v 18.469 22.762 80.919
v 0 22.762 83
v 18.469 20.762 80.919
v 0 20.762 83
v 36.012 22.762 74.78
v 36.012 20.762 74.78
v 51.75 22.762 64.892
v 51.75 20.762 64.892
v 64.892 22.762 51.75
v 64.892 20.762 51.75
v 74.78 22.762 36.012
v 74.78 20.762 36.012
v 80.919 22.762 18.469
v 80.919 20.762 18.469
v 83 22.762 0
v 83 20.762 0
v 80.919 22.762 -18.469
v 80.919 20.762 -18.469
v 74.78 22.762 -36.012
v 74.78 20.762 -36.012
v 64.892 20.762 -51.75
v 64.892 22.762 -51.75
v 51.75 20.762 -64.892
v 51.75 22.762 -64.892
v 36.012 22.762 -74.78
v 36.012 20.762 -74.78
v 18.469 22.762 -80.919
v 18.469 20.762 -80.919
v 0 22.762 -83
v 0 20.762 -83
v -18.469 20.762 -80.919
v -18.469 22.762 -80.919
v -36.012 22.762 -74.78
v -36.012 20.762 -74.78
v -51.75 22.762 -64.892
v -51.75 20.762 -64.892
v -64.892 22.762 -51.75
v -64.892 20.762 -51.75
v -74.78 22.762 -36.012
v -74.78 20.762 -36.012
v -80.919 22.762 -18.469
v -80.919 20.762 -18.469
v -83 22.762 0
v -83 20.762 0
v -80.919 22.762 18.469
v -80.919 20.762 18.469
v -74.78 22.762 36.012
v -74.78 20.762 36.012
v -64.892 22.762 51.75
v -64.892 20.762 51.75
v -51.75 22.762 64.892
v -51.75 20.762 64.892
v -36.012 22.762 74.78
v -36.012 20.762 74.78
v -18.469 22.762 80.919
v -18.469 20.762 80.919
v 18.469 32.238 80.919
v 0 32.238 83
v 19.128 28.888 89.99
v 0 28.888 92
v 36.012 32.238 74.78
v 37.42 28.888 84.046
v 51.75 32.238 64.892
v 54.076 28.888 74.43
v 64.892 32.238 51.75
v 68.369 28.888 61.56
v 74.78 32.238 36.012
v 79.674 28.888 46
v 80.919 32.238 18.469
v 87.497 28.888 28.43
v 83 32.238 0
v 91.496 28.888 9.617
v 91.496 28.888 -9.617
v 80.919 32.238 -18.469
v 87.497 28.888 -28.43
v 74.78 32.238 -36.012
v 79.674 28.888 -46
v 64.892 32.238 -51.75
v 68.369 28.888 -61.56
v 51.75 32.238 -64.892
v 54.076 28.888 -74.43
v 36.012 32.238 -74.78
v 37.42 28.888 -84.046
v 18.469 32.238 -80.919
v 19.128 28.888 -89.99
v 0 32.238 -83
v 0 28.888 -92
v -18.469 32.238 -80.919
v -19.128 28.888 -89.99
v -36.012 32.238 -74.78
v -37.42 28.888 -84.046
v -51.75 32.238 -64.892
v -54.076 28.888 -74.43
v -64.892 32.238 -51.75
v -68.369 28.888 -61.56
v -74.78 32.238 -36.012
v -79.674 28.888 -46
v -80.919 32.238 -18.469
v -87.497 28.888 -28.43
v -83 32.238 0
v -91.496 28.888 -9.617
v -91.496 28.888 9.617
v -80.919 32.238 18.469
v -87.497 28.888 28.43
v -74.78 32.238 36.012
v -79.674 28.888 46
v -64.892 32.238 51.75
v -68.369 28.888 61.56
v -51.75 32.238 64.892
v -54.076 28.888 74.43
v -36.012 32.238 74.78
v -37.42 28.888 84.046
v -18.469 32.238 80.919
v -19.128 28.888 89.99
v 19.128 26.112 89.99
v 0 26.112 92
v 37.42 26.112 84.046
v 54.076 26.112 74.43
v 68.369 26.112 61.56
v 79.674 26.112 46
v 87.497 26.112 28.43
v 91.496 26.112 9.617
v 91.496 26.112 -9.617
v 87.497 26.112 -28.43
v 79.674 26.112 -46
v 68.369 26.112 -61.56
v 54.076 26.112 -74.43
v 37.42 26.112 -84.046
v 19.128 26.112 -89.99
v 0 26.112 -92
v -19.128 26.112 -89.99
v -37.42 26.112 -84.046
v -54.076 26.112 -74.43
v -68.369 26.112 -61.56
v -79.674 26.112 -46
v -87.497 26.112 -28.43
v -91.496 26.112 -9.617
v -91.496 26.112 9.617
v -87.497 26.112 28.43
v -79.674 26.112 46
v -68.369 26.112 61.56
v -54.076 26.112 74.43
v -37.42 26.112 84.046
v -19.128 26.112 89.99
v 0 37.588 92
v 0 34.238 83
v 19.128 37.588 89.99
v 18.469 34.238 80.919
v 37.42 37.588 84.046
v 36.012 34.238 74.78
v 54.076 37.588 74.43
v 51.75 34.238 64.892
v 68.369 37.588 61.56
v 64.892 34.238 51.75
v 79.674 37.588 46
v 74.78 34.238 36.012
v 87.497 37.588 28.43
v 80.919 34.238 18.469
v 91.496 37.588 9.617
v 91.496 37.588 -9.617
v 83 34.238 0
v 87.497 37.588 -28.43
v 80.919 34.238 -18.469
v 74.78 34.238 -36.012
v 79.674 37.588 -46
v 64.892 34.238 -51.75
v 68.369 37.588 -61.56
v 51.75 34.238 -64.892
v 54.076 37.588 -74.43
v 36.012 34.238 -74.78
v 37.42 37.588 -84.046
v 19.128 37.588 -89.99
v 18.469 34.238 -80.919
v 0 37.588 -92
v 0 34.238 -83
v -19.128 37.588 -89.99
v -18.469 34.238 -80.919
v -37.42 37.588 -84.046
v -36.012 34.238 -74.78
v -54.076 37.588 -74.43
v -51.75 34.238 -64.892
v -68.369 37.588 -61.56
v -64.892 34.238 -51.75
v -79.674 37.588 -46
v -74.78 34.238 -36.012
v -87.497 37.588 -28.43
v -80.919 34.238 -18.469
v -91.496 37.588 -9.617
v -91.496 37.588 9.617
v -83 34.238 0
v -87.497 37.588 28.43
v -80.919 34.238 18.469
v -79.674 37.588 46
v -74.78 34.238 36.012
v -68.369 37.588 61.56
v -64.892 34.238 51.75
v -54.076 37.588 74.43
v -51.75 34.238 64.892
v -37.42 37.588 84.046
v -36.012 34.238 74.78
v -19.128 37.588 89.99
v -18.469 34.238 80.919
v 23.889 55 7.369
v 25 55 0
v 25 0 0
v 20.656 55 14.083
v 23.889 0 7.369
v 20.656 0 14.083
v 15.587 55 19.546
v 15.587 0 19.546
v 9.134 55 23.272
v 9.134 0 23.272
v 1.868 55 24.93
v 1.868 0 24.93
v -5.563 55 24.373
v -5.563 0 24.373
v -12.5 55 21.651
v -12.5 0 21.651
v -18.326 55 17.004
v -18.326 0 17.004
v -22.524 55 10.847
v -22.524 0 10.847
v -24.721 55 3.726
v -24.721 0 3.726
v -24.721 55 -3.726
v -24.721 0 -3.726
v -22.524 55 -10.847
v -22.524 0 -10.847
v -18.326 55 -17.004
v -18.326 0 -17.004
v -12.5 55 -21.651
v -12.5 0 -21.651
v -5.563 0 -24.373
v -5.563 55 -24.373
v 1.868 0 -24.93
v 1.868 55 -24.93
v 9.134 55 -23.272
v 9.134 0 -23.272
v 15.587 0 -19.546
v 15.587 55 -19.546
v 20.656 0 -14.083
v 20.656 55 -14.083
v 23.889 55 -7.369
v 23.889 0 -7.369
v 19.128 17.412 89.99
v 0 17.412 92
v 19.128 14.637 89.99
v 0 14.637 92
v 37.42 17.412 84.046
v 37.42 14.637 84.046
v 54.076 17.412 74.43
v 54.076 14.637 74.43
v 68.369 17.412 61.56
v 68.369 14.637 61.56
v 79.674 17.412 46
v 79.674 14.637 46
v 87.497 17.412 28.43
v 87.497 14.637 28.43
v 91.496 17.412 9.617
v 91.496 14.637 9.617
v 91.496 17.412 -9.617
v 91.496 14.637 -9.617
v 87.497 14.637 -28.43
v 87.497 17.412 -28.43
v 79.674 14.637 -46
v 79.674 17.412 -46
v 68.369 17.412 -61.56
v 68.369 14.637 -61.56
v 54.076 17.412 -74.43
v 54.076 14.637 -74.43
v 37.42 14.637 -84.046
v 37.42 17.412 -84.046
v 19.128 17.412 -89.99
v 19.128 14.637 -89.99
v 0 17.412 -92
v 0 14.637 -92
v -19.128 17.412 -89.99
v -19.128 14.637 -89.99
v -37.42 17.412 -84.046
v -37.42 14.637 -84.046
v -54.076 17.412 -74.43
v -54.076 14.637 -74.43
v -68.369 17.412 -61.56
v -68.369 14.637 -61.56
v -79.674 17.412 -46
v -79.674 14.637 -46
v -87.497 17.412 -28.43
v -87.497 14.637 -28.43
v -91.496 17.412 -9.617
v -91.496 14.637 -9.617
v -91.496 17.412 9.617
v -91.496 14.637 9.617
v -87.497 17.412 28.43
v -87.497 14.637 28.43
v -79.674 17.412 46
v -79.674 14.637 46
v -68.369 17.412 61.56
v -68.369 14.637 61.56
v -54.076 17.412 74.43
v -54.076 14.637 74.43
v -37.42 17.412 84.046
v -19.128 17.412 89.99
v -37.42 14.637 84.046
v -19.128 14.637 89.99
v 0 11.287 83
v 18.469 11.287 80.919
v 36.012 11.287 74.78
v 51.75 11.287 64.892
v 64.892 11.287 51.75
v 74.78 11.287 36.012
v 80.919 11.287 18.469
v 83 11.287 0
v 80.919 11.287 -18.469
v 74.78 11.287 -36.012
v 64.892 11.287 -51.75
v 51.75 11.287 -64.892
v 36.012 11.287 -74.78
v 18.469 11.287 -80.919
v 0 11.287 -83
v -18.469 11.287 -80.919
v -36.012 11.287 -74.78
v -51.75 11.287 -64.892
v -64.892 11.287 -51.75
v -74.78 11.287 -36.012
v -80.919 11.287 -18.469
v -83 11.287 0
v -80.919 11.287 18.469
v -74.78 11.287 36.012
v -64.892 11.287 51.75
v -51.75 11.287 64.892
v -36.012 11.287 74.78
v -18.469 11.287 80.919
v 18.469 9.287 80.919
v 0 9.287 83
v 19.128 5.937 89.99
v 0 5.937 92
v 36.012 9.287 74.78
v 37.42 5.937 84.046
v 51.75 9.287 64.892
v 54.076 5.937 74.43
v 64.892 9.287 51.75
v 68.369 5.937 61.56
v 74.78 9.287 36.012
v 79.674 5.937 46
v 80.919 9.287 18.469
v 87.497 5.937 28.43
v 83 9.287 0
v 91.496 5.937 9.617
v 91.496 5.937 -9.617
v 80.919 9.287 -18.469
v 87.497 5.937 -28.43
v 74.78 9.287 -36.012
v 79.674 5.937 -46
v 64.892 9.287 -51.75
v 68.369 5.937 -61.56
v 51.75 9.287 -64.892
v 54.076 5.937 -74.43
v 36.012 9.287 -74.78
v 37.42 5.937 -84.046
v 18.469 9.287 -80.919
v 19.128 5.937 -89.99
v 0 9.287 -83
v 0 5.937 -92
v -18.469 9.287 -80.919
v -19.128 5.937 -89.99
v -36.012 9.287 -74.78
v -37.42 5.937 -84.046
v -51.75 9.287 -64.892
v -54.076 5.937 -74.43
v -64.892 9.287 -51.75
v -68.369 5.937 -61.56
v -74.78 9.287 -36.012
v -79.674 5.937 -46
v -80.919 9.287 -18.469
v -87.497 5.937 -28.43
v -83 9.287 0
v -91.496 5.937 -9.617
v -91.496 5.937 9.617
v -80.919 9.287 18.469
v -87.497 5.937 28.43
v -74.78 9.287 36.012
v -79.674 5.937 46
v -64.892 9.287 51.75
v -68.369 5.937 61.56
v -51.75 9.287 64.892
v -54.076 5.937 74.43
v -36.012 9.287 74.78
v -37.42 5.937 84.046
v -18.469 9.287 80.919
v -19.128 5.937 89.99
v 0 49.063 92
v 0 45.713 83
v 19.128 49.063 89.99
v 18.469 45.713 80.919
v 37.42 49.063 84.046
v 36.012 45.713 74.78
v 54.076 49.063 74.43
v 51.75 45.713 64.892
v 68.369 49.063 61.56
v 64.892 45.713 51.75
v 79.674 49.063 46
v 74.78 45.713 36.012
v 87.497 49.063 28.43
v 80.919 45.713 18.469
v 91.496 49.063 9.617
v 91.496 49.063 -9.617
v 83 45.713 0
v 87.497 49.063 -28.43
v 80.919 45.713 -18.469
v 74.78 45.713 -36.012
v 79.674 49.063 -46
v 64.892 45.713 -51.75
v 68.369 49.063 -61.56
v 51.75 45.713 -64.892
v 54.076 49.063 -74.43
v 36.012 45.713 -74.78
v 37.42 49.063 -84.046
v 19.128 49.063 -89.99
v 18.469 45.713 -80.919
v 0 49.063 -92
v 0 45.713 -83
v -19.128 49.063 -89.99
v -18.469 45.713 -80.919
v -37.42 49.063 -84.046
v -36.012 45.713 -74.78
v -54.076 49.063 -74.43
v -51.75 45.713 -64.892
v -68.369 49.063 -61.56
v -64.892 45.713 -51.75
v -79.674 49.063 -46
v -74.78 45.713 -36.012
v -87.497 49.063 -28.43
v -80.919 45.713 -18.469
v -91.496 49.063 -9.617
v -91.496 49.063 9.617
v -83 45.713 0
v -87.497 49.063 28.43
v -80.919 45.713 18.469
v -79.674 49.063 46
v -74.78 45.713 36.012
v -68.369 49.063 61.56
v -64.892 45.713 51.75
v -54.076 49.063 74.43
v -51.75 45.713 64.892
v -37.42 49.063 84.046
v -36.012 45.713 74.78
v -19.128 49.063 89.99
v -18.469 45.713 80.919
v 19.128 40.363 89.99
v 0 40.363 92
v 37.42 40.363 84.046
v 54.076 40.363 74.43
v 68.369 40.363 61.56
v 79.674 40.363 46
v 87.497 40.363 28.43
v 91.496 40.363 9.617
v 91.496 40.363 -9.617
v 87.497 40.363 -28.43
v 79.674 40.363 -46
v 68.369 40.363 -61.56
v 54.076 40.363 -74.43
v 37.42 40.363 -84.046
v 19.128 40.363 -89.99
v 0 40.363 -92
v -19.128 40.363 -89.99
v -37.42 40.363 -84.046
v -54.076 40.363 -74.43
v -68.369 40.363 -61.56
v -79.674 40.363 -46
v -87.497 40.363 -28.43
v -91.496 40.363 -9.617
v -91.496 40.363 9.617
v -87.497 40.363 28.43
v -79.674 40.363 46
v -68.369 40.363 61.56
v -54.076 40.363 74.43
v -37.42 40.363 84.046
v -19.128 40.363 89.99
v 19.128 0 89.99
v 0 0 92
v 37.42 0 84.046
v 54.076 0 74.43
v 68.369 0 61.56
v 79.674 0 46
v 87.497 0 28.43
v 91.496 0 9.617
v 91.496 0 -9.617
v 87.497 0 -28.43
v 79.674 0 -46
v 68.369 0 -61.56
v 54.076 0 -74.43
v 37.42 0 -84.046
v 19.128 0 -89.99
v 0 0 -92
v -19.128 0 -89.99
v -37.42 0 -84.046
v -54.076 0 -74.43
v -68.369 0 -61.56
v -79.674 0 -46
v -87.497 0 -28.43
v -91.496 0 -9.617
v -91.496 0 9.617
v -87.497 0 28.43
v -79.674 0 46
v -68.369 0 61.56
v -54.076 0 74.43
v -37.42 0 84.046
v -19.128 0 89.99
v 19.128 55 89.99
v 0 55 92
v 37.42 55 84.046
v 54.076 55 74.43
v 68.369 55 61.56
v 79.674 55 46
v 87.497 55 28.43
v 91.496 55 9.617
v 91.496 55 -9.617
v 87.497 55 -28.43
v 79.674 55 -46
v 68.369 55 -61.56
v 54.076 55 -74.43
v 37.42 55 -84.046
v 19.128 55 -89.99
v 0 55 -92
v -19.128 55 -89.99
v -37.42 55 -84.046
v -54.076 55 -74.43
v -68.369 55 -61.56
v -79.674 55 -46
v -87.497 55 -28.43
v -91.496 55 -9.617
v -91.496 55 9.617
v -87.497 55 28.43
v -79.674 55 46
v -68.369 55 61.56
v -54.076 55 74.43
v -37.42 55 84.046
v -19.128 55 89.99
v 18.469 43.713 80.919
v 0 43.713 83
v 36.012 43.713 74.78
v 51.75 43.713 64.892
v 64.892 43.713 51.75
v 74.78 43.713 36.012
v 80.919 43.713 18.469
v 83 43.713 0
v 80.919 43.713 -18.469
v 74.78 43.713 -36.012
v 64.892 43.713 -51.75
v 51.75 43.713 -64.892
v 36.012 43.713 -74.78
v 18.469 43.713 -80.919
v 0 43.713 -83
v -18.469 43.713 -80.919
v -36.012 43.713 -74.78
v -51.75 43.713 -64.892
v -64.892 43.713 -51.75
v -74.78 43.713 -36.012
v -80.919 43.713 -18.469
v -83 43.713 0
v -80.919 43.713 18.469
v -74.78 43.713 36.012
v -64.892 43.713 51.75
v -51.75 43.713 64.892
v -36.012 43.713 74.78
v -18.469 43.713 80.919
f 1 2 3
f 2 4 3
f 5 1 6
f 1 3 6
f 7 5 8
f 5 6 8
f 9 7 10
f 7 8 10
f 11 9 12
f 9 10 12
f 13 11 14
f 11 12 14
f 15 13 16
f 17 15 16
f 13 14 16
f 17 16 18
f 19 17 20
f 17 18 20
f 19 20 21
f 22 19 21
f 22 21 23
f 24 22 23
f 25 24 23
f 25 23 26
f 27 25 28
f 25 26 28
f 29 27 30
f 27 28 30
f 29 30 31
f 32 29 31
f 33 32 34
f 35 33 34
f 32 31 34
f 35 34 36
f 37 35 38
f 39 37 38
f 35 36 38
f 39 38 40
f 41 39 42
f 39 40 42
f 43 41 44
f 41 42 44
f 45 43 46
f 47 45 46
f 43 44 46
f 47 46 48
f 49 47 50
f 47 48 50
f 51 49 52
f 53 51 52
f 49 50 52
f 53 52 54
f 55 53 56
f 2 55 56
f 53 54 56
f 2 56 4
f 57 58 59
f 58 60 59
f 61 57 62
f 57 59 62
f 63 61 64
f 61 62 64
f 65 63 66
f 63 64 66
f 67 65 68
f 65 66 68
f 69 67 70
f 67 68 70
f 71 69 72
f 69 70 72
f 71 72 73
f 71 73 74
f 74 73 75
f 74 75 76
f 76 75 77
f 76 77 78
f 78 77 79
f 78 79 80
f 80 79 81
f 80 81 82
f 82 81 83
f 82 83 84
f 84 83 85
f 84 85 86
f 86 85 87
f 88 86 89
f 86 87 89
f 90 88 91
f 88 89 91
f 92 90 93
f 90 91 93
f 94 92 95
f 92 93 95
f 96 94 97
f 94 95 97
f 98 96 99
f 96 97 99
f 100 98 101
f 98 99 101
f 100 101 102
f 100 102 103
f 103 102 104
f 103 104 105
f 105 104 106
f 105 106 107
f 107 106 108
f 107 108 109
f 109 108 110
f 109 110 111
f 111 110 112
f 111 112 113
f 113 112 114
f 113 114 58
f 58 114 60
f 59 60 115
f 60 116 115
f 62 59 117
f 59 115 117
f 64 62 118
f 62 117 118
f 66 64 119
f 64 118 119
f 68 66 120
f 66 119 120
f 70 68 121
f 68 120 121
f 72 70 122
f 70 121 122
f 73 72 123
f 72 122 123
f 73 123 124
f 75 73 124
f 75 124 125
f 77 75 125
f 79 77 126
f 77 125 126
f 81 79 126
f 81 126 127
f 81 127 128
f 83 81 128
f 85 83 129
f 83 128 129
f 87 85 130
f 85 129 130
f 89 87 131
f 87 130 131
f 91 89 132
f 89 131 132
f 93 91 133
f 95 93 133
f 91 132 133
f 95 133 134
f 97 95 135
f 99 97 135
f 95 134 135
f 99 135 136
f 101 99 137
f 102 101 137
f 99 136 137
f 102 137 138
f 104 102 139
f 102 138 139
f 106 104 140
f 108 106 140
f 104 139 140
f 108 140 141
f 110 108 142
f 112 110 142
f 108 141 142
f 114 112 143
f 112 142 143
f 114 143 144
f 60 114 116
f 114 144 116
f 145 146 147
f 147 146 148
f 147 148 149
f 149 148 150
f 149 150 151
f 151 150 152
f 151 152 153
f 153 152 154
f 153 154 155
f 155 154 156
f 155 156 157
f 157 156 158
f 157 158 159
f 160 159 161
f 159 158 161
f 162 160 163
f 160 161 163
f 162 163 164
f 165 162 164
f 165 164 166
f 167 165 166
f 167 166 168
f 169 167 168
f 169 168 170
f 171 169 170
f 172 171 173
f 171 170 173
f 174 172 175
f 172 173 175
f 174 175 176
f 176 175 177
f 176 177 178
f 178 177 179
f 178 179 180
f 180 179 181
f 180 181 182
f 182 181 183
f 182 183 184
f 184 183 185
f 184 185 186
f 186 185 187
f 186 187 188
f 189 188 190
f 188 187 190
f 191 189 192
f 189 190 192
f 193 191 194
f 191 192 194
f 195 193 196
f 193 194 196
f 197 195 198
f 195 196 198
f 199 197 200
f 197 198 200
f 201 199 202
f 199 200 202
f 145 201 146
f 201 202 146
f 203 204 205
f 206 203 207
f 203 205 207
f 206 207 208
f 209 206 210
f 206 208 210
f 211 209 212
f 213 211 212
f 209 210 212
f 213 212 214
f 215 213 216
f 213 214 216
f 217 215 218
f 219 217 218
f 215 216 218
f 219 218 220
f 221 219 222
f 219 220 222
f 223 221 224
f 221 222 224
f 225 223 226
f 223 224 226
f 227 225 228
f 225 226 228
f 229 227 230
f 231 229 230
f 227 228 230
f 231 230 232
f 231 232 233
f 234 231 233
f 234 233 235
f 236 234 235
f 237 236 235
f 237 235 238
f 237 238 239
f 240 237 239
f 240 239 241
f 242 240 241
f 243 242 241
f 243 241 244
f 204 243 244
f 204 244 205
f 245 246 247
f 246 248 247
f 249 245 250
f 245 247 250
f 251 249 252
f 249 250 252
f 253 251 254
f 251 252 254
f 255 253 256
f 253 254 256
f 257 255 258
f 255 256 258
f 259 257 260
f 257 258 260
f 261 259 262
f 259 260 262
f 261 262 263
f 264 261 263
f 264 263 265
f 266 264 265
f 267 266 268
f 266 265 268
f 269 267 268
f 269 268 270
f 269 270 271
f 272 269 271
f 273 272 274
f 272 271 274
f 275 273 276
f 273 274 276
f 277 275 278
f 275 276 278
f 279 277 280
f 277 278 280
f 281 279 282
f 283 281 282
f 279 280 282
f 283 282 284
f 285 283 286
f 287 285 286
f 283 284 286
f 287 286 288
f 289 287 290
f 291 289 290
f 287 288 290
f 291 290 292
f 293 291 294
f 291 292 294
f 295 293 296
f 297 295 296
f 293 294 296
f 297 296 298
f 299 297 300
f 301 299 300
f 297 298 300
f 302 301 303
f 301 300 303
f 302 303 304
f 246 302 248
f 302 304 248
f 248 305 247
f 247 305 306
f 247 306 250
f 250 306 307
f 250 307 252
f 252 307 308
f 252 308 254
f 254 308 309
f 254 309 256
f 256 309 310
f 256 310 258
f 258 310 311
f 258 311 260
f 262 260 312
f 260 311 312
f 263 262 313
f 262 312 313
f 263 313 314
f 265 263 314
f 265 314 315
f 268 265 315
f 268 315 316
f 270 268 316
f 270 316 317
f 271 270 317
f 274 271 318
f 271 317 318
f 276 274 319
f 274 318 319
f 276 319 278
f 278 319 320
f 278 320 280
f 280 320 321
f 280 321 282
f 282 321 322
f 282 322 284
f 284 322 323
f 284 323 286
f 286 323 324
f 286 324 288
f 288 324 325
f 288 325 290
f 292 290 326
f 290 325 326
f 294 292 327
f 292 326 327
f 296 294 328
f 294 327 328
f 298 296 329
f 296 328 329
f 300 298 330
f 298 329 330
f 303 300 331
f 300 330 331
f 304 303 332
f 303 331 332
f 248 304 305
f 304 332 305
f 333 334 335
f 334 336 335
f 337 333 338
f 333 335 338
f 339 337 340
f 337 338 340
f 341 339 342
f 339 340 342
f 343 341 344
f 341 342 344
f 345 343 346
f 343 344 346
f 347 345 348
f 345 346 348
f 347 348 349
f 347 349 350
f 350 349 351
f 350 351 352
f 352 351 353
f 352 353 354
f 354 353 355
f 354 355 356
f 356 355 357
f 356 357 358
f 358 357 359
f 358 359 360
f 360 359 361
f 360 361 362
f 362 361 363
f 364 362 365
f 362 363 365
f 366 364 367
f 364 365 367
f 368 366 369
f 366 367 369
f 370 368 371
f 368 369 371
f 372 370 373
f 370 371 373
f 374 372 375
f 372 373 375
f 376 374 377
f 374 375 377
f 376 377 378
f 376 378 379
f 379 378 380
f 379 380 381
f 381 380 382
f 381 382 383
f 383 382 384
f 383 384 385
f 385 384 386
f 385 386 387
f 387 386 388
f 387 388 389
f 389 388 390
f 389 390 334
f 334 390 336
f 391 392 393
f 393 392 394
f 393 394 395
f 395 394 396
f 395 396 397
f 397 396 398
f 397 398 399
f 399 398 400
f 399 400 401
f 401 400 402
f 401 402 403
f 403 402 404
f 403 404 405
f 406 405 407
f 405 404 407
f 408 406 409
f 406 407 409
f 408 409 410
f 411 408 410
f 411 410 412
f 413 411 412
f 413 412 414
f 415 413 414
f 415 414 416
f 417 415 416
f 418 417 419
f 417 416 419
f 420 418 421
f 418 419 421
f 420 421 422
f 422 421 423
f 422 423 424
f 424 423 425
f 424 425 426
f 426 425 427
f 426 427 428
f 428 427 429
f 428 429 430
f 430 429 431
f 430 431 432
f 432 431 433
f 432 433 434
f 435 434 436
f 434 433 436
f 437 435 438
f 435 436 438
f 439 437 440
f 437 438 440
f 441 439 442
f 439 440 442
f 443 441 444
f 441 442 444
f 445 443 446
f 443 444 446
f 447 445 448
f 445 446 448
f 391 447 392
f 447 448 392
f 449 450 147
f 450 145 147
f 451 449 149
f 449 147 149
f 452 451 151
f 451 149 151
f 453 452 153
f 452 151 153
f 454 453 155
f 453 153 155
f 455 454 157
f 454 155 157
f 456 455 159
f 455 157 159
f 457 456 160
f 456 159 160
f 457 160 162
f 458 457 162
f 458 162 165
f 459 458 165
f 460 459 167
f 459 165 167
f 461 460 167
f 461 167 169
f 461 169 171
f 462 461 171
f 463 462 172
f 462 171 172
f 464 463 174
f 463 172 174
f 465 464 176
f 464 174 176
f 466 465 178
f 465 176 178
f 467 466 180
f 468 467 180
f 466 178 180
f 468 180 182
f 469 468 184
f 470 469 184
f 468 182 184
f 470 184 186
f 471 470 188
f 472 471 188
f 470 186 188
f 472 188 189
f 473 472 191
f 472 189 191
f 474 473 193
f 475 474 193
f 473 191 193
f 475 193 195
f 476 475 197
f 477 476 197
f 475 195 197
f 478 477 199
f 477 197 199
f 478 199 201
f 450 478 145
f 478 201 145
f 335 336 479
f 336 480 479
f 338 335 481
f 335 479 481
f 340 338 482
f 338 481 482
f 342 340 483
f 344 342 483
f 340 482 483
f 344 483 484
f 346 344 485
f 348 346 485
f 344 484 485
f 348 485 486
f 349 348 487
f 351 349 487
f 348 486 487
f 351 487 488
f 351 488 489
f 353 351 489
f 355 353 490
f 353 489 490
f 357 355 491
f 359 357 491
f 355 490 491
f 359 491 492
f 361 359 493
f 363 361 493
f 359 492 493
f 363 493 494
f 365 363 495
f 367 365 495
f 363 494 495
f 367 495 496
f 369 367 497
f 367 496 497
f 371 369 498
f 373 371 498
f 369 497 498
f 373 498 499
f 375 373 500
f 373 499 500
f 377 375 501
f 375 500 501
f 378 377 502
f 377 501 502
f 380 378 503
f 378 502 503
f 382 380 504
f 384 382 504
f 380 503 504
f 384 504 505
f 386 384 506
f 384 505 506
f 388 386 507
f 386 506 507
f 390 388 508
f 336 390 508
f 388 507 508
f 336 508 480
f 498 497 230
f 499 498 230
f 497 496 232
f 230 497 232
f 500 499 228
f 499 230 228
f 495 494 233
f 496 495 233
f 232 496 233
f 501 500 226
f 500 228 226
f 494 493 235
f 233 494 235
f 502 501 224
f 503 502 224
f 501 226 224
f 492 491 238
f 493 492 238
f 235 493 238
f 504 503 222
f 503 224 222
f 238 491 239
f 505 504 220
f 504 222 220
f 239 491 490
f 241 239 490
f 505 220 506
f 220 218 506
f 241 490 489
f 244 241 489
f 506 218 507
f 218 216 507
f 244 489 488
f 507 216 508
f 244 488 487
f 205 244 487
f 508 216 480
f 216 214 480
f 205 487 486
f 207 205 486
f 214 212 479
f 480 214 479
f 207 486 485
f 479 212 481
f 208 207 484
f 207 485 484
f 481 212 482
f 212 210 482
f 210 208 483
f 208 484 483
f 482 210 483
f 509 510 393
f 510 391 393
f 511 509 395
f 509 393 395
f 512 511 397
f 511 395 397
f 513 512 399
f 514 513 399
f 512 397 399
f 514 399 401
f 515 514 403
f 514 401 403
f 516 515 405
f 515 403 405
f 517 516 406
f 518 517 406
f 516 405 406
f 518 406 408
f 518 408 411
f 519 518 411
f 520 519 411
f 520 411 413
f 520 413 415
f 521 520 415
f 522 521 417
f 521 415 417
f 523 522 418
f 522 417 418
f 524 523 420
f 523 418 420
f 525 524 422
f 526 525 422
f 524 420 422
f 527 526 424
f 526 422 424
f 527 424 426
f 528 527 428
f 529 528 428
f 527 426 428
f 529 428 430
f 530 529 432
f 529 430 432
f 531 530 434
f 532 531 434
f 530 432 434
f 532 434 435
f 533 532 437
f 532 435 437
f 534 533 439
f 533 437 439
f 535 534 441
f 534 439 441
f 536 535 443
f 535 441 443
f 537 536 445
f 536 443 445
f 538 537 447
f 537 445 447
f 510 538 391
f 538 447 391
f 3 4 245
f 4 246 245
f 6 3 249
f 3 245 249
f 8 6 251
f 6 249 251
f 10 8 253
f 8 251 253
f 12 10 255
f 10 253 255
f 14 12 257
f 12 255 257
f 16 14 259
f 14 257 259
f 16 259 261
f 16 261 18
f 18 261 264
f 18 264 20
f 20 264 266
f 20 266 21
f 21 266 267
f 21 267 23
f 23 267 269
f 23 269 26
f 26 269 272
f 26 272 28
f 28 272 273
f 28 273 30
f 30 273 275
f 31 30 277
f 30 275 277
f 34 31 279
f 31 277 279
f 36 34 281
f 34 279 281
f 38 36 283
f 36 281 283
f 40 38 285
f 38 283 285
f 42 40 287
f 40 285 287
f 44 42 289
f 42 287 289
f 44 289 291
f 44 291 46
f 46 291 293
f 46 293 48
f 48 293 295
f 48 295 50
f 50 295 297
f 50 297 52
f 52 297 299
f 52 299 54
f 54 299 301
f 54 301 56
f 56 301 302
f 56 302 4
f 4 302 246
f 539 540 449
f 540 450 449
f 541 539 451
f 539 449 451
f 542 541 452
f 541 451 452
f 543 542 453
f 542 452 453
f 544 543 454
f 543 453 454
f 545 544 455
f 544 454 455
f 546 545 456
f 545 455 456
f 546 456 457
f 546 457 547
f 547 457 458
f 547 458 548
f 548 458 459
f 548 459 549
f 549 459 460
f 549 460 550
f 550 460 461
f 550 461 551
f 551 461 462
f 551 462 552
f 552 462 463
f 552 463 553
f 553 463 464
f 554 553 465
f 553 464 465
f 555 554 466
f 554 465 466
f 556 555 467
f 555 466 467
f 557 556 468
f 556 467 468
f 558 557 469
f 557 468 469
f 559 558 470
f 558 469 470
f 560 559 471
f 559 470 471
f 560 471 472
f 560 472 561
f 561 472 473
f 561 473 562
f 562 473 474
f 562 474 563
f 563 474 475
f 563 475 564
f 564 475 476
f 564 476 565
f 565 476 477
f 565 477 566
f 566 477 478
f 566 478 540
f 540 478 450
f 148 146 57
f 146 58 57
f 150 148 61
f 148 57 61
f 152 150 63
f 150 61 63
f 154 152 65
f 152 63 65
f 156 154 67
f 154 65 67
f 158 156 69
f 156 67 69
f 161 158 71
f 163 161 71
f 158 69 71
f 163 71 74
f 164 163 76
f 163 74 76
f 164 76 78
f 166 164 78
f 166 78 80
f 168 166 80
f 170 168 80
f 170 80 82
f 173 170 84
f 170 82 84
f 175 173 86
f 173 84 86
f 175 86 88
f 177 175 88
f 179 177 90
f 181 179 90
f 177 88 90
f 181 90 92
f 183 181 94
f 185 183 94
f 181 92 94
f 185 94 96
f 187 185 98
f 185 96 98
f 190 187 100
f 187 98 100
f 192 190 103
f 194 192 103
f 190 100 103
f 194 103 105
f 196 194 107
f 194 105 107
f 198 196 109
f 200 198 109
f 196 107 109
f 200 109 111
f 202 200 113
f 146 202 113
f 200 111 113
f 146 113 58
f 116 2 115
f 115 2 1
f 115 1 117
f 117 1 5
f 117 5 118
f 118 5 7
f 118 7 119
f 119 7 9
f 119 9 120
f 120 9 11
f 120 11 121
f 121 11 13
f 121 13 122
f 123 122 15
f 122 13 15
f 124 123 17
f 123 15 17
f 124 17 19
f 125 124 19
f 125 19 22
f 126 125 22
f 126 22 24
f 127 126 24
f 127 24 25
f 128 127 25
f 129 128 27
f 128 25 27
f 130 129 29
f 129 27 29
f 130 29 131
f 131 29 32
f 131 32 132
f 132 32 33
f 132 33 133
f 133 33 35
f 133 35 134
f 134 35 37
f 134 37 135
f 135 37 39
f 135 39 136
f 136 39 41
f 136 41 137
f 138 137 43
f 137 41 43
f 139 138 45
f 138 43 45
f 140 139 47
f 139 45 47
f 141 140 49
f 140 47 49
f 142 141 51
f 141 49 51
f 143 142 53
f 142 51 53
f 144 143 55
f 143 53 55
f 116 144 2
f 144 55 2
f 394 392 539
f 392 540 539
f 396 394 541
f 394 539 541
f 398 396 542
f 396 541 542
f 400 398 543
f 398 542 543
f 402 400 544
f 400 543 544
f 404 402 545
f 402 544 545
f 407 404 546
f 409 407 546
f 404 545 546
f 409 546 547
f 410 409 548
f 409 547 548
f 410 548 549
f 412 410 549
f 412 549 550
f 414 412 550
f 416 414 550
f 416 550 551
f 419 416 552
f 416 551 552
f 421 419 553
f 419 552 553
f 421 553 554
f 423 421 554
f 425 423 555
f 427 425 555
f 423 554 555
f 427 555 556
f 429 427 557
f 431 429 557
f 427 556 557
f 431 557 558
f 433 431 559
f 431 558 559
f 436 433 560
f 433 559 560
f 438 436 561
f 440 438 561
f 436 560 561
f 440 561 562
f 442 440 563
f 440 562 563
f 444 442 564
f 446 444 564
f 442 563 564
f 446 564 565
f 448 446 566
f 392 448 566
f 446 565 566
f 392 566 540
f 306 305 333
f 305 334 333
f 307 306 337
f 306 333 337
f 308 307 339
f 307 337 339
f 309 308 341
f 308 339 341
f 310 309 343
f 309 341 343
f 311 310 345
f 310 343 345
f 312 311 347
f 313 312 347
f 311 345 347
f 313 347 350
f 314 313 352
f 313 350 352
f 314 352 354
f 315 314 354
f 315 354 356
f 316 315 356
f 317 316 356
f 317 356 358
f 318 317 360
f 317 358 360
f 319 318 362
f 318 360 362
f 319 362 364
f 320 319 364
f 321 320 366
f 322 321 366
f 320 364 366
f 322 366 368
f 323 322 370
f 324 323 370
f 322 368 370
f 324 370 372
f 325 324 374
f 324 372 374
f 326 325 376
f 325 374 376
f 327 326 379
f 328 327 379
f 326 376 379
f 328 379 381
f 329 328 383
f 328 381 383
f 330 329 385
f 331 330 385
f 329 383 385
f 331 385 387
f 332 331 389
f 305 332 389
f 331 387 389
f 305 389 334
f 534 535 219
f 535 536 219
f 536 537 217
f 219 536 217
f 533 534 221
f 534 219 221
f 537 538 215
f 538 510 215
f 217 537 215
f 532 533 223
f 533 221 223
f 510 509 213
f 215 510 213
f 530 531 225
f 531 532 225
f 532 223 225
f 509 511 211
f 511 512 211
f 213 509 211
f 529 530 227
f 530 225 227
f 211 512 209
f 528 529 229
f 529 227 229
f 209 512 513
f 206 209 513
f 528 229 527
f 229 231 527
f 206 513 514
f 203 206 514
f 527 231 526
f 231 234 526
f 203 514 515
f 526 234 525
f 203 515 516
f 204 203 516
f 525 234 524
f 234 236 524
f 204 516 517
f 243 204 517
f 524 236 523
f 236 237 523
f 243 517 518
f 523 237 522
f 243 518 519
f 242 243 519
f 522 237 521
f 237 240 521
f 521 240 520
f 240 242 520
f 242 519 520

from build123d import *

# Parameters (mm, degrees)
F2_R     = 25
F3_DEPTH = 55.001


with BuildPart() as f1:
    # F0 (on Right) → F1 (revolve)
    with BuildSketch(Plane.YZ):
        Polygon((0, 92), (0, 0), (55, 0), (55, 92), (49.063487, 92), (45.713487, 83), (43.713487, 83), (40.363487, 92), (37.587829, 92), (34.237829, 83), (32.237829, 83), (28.887829, 92), (26.112171, 92), (22.762171, 83), (20.762171, 83), (17.412171, 92), (14.636513, 92), (11.286513, 83), (9.286513, 83), (5.936513, 92), align=None)
    revolve(axis=Axis((0, 27.5, 0), (0, 1, 0)))

    # F2 (on face) → F3 (cut, through all)
    with BuildSketch(Plane.XZ):
        Circle(F2_R)
    extrude(amount=-F3_DEPTH, mode=Mode.SUBTRACT)


solid = f1.part
